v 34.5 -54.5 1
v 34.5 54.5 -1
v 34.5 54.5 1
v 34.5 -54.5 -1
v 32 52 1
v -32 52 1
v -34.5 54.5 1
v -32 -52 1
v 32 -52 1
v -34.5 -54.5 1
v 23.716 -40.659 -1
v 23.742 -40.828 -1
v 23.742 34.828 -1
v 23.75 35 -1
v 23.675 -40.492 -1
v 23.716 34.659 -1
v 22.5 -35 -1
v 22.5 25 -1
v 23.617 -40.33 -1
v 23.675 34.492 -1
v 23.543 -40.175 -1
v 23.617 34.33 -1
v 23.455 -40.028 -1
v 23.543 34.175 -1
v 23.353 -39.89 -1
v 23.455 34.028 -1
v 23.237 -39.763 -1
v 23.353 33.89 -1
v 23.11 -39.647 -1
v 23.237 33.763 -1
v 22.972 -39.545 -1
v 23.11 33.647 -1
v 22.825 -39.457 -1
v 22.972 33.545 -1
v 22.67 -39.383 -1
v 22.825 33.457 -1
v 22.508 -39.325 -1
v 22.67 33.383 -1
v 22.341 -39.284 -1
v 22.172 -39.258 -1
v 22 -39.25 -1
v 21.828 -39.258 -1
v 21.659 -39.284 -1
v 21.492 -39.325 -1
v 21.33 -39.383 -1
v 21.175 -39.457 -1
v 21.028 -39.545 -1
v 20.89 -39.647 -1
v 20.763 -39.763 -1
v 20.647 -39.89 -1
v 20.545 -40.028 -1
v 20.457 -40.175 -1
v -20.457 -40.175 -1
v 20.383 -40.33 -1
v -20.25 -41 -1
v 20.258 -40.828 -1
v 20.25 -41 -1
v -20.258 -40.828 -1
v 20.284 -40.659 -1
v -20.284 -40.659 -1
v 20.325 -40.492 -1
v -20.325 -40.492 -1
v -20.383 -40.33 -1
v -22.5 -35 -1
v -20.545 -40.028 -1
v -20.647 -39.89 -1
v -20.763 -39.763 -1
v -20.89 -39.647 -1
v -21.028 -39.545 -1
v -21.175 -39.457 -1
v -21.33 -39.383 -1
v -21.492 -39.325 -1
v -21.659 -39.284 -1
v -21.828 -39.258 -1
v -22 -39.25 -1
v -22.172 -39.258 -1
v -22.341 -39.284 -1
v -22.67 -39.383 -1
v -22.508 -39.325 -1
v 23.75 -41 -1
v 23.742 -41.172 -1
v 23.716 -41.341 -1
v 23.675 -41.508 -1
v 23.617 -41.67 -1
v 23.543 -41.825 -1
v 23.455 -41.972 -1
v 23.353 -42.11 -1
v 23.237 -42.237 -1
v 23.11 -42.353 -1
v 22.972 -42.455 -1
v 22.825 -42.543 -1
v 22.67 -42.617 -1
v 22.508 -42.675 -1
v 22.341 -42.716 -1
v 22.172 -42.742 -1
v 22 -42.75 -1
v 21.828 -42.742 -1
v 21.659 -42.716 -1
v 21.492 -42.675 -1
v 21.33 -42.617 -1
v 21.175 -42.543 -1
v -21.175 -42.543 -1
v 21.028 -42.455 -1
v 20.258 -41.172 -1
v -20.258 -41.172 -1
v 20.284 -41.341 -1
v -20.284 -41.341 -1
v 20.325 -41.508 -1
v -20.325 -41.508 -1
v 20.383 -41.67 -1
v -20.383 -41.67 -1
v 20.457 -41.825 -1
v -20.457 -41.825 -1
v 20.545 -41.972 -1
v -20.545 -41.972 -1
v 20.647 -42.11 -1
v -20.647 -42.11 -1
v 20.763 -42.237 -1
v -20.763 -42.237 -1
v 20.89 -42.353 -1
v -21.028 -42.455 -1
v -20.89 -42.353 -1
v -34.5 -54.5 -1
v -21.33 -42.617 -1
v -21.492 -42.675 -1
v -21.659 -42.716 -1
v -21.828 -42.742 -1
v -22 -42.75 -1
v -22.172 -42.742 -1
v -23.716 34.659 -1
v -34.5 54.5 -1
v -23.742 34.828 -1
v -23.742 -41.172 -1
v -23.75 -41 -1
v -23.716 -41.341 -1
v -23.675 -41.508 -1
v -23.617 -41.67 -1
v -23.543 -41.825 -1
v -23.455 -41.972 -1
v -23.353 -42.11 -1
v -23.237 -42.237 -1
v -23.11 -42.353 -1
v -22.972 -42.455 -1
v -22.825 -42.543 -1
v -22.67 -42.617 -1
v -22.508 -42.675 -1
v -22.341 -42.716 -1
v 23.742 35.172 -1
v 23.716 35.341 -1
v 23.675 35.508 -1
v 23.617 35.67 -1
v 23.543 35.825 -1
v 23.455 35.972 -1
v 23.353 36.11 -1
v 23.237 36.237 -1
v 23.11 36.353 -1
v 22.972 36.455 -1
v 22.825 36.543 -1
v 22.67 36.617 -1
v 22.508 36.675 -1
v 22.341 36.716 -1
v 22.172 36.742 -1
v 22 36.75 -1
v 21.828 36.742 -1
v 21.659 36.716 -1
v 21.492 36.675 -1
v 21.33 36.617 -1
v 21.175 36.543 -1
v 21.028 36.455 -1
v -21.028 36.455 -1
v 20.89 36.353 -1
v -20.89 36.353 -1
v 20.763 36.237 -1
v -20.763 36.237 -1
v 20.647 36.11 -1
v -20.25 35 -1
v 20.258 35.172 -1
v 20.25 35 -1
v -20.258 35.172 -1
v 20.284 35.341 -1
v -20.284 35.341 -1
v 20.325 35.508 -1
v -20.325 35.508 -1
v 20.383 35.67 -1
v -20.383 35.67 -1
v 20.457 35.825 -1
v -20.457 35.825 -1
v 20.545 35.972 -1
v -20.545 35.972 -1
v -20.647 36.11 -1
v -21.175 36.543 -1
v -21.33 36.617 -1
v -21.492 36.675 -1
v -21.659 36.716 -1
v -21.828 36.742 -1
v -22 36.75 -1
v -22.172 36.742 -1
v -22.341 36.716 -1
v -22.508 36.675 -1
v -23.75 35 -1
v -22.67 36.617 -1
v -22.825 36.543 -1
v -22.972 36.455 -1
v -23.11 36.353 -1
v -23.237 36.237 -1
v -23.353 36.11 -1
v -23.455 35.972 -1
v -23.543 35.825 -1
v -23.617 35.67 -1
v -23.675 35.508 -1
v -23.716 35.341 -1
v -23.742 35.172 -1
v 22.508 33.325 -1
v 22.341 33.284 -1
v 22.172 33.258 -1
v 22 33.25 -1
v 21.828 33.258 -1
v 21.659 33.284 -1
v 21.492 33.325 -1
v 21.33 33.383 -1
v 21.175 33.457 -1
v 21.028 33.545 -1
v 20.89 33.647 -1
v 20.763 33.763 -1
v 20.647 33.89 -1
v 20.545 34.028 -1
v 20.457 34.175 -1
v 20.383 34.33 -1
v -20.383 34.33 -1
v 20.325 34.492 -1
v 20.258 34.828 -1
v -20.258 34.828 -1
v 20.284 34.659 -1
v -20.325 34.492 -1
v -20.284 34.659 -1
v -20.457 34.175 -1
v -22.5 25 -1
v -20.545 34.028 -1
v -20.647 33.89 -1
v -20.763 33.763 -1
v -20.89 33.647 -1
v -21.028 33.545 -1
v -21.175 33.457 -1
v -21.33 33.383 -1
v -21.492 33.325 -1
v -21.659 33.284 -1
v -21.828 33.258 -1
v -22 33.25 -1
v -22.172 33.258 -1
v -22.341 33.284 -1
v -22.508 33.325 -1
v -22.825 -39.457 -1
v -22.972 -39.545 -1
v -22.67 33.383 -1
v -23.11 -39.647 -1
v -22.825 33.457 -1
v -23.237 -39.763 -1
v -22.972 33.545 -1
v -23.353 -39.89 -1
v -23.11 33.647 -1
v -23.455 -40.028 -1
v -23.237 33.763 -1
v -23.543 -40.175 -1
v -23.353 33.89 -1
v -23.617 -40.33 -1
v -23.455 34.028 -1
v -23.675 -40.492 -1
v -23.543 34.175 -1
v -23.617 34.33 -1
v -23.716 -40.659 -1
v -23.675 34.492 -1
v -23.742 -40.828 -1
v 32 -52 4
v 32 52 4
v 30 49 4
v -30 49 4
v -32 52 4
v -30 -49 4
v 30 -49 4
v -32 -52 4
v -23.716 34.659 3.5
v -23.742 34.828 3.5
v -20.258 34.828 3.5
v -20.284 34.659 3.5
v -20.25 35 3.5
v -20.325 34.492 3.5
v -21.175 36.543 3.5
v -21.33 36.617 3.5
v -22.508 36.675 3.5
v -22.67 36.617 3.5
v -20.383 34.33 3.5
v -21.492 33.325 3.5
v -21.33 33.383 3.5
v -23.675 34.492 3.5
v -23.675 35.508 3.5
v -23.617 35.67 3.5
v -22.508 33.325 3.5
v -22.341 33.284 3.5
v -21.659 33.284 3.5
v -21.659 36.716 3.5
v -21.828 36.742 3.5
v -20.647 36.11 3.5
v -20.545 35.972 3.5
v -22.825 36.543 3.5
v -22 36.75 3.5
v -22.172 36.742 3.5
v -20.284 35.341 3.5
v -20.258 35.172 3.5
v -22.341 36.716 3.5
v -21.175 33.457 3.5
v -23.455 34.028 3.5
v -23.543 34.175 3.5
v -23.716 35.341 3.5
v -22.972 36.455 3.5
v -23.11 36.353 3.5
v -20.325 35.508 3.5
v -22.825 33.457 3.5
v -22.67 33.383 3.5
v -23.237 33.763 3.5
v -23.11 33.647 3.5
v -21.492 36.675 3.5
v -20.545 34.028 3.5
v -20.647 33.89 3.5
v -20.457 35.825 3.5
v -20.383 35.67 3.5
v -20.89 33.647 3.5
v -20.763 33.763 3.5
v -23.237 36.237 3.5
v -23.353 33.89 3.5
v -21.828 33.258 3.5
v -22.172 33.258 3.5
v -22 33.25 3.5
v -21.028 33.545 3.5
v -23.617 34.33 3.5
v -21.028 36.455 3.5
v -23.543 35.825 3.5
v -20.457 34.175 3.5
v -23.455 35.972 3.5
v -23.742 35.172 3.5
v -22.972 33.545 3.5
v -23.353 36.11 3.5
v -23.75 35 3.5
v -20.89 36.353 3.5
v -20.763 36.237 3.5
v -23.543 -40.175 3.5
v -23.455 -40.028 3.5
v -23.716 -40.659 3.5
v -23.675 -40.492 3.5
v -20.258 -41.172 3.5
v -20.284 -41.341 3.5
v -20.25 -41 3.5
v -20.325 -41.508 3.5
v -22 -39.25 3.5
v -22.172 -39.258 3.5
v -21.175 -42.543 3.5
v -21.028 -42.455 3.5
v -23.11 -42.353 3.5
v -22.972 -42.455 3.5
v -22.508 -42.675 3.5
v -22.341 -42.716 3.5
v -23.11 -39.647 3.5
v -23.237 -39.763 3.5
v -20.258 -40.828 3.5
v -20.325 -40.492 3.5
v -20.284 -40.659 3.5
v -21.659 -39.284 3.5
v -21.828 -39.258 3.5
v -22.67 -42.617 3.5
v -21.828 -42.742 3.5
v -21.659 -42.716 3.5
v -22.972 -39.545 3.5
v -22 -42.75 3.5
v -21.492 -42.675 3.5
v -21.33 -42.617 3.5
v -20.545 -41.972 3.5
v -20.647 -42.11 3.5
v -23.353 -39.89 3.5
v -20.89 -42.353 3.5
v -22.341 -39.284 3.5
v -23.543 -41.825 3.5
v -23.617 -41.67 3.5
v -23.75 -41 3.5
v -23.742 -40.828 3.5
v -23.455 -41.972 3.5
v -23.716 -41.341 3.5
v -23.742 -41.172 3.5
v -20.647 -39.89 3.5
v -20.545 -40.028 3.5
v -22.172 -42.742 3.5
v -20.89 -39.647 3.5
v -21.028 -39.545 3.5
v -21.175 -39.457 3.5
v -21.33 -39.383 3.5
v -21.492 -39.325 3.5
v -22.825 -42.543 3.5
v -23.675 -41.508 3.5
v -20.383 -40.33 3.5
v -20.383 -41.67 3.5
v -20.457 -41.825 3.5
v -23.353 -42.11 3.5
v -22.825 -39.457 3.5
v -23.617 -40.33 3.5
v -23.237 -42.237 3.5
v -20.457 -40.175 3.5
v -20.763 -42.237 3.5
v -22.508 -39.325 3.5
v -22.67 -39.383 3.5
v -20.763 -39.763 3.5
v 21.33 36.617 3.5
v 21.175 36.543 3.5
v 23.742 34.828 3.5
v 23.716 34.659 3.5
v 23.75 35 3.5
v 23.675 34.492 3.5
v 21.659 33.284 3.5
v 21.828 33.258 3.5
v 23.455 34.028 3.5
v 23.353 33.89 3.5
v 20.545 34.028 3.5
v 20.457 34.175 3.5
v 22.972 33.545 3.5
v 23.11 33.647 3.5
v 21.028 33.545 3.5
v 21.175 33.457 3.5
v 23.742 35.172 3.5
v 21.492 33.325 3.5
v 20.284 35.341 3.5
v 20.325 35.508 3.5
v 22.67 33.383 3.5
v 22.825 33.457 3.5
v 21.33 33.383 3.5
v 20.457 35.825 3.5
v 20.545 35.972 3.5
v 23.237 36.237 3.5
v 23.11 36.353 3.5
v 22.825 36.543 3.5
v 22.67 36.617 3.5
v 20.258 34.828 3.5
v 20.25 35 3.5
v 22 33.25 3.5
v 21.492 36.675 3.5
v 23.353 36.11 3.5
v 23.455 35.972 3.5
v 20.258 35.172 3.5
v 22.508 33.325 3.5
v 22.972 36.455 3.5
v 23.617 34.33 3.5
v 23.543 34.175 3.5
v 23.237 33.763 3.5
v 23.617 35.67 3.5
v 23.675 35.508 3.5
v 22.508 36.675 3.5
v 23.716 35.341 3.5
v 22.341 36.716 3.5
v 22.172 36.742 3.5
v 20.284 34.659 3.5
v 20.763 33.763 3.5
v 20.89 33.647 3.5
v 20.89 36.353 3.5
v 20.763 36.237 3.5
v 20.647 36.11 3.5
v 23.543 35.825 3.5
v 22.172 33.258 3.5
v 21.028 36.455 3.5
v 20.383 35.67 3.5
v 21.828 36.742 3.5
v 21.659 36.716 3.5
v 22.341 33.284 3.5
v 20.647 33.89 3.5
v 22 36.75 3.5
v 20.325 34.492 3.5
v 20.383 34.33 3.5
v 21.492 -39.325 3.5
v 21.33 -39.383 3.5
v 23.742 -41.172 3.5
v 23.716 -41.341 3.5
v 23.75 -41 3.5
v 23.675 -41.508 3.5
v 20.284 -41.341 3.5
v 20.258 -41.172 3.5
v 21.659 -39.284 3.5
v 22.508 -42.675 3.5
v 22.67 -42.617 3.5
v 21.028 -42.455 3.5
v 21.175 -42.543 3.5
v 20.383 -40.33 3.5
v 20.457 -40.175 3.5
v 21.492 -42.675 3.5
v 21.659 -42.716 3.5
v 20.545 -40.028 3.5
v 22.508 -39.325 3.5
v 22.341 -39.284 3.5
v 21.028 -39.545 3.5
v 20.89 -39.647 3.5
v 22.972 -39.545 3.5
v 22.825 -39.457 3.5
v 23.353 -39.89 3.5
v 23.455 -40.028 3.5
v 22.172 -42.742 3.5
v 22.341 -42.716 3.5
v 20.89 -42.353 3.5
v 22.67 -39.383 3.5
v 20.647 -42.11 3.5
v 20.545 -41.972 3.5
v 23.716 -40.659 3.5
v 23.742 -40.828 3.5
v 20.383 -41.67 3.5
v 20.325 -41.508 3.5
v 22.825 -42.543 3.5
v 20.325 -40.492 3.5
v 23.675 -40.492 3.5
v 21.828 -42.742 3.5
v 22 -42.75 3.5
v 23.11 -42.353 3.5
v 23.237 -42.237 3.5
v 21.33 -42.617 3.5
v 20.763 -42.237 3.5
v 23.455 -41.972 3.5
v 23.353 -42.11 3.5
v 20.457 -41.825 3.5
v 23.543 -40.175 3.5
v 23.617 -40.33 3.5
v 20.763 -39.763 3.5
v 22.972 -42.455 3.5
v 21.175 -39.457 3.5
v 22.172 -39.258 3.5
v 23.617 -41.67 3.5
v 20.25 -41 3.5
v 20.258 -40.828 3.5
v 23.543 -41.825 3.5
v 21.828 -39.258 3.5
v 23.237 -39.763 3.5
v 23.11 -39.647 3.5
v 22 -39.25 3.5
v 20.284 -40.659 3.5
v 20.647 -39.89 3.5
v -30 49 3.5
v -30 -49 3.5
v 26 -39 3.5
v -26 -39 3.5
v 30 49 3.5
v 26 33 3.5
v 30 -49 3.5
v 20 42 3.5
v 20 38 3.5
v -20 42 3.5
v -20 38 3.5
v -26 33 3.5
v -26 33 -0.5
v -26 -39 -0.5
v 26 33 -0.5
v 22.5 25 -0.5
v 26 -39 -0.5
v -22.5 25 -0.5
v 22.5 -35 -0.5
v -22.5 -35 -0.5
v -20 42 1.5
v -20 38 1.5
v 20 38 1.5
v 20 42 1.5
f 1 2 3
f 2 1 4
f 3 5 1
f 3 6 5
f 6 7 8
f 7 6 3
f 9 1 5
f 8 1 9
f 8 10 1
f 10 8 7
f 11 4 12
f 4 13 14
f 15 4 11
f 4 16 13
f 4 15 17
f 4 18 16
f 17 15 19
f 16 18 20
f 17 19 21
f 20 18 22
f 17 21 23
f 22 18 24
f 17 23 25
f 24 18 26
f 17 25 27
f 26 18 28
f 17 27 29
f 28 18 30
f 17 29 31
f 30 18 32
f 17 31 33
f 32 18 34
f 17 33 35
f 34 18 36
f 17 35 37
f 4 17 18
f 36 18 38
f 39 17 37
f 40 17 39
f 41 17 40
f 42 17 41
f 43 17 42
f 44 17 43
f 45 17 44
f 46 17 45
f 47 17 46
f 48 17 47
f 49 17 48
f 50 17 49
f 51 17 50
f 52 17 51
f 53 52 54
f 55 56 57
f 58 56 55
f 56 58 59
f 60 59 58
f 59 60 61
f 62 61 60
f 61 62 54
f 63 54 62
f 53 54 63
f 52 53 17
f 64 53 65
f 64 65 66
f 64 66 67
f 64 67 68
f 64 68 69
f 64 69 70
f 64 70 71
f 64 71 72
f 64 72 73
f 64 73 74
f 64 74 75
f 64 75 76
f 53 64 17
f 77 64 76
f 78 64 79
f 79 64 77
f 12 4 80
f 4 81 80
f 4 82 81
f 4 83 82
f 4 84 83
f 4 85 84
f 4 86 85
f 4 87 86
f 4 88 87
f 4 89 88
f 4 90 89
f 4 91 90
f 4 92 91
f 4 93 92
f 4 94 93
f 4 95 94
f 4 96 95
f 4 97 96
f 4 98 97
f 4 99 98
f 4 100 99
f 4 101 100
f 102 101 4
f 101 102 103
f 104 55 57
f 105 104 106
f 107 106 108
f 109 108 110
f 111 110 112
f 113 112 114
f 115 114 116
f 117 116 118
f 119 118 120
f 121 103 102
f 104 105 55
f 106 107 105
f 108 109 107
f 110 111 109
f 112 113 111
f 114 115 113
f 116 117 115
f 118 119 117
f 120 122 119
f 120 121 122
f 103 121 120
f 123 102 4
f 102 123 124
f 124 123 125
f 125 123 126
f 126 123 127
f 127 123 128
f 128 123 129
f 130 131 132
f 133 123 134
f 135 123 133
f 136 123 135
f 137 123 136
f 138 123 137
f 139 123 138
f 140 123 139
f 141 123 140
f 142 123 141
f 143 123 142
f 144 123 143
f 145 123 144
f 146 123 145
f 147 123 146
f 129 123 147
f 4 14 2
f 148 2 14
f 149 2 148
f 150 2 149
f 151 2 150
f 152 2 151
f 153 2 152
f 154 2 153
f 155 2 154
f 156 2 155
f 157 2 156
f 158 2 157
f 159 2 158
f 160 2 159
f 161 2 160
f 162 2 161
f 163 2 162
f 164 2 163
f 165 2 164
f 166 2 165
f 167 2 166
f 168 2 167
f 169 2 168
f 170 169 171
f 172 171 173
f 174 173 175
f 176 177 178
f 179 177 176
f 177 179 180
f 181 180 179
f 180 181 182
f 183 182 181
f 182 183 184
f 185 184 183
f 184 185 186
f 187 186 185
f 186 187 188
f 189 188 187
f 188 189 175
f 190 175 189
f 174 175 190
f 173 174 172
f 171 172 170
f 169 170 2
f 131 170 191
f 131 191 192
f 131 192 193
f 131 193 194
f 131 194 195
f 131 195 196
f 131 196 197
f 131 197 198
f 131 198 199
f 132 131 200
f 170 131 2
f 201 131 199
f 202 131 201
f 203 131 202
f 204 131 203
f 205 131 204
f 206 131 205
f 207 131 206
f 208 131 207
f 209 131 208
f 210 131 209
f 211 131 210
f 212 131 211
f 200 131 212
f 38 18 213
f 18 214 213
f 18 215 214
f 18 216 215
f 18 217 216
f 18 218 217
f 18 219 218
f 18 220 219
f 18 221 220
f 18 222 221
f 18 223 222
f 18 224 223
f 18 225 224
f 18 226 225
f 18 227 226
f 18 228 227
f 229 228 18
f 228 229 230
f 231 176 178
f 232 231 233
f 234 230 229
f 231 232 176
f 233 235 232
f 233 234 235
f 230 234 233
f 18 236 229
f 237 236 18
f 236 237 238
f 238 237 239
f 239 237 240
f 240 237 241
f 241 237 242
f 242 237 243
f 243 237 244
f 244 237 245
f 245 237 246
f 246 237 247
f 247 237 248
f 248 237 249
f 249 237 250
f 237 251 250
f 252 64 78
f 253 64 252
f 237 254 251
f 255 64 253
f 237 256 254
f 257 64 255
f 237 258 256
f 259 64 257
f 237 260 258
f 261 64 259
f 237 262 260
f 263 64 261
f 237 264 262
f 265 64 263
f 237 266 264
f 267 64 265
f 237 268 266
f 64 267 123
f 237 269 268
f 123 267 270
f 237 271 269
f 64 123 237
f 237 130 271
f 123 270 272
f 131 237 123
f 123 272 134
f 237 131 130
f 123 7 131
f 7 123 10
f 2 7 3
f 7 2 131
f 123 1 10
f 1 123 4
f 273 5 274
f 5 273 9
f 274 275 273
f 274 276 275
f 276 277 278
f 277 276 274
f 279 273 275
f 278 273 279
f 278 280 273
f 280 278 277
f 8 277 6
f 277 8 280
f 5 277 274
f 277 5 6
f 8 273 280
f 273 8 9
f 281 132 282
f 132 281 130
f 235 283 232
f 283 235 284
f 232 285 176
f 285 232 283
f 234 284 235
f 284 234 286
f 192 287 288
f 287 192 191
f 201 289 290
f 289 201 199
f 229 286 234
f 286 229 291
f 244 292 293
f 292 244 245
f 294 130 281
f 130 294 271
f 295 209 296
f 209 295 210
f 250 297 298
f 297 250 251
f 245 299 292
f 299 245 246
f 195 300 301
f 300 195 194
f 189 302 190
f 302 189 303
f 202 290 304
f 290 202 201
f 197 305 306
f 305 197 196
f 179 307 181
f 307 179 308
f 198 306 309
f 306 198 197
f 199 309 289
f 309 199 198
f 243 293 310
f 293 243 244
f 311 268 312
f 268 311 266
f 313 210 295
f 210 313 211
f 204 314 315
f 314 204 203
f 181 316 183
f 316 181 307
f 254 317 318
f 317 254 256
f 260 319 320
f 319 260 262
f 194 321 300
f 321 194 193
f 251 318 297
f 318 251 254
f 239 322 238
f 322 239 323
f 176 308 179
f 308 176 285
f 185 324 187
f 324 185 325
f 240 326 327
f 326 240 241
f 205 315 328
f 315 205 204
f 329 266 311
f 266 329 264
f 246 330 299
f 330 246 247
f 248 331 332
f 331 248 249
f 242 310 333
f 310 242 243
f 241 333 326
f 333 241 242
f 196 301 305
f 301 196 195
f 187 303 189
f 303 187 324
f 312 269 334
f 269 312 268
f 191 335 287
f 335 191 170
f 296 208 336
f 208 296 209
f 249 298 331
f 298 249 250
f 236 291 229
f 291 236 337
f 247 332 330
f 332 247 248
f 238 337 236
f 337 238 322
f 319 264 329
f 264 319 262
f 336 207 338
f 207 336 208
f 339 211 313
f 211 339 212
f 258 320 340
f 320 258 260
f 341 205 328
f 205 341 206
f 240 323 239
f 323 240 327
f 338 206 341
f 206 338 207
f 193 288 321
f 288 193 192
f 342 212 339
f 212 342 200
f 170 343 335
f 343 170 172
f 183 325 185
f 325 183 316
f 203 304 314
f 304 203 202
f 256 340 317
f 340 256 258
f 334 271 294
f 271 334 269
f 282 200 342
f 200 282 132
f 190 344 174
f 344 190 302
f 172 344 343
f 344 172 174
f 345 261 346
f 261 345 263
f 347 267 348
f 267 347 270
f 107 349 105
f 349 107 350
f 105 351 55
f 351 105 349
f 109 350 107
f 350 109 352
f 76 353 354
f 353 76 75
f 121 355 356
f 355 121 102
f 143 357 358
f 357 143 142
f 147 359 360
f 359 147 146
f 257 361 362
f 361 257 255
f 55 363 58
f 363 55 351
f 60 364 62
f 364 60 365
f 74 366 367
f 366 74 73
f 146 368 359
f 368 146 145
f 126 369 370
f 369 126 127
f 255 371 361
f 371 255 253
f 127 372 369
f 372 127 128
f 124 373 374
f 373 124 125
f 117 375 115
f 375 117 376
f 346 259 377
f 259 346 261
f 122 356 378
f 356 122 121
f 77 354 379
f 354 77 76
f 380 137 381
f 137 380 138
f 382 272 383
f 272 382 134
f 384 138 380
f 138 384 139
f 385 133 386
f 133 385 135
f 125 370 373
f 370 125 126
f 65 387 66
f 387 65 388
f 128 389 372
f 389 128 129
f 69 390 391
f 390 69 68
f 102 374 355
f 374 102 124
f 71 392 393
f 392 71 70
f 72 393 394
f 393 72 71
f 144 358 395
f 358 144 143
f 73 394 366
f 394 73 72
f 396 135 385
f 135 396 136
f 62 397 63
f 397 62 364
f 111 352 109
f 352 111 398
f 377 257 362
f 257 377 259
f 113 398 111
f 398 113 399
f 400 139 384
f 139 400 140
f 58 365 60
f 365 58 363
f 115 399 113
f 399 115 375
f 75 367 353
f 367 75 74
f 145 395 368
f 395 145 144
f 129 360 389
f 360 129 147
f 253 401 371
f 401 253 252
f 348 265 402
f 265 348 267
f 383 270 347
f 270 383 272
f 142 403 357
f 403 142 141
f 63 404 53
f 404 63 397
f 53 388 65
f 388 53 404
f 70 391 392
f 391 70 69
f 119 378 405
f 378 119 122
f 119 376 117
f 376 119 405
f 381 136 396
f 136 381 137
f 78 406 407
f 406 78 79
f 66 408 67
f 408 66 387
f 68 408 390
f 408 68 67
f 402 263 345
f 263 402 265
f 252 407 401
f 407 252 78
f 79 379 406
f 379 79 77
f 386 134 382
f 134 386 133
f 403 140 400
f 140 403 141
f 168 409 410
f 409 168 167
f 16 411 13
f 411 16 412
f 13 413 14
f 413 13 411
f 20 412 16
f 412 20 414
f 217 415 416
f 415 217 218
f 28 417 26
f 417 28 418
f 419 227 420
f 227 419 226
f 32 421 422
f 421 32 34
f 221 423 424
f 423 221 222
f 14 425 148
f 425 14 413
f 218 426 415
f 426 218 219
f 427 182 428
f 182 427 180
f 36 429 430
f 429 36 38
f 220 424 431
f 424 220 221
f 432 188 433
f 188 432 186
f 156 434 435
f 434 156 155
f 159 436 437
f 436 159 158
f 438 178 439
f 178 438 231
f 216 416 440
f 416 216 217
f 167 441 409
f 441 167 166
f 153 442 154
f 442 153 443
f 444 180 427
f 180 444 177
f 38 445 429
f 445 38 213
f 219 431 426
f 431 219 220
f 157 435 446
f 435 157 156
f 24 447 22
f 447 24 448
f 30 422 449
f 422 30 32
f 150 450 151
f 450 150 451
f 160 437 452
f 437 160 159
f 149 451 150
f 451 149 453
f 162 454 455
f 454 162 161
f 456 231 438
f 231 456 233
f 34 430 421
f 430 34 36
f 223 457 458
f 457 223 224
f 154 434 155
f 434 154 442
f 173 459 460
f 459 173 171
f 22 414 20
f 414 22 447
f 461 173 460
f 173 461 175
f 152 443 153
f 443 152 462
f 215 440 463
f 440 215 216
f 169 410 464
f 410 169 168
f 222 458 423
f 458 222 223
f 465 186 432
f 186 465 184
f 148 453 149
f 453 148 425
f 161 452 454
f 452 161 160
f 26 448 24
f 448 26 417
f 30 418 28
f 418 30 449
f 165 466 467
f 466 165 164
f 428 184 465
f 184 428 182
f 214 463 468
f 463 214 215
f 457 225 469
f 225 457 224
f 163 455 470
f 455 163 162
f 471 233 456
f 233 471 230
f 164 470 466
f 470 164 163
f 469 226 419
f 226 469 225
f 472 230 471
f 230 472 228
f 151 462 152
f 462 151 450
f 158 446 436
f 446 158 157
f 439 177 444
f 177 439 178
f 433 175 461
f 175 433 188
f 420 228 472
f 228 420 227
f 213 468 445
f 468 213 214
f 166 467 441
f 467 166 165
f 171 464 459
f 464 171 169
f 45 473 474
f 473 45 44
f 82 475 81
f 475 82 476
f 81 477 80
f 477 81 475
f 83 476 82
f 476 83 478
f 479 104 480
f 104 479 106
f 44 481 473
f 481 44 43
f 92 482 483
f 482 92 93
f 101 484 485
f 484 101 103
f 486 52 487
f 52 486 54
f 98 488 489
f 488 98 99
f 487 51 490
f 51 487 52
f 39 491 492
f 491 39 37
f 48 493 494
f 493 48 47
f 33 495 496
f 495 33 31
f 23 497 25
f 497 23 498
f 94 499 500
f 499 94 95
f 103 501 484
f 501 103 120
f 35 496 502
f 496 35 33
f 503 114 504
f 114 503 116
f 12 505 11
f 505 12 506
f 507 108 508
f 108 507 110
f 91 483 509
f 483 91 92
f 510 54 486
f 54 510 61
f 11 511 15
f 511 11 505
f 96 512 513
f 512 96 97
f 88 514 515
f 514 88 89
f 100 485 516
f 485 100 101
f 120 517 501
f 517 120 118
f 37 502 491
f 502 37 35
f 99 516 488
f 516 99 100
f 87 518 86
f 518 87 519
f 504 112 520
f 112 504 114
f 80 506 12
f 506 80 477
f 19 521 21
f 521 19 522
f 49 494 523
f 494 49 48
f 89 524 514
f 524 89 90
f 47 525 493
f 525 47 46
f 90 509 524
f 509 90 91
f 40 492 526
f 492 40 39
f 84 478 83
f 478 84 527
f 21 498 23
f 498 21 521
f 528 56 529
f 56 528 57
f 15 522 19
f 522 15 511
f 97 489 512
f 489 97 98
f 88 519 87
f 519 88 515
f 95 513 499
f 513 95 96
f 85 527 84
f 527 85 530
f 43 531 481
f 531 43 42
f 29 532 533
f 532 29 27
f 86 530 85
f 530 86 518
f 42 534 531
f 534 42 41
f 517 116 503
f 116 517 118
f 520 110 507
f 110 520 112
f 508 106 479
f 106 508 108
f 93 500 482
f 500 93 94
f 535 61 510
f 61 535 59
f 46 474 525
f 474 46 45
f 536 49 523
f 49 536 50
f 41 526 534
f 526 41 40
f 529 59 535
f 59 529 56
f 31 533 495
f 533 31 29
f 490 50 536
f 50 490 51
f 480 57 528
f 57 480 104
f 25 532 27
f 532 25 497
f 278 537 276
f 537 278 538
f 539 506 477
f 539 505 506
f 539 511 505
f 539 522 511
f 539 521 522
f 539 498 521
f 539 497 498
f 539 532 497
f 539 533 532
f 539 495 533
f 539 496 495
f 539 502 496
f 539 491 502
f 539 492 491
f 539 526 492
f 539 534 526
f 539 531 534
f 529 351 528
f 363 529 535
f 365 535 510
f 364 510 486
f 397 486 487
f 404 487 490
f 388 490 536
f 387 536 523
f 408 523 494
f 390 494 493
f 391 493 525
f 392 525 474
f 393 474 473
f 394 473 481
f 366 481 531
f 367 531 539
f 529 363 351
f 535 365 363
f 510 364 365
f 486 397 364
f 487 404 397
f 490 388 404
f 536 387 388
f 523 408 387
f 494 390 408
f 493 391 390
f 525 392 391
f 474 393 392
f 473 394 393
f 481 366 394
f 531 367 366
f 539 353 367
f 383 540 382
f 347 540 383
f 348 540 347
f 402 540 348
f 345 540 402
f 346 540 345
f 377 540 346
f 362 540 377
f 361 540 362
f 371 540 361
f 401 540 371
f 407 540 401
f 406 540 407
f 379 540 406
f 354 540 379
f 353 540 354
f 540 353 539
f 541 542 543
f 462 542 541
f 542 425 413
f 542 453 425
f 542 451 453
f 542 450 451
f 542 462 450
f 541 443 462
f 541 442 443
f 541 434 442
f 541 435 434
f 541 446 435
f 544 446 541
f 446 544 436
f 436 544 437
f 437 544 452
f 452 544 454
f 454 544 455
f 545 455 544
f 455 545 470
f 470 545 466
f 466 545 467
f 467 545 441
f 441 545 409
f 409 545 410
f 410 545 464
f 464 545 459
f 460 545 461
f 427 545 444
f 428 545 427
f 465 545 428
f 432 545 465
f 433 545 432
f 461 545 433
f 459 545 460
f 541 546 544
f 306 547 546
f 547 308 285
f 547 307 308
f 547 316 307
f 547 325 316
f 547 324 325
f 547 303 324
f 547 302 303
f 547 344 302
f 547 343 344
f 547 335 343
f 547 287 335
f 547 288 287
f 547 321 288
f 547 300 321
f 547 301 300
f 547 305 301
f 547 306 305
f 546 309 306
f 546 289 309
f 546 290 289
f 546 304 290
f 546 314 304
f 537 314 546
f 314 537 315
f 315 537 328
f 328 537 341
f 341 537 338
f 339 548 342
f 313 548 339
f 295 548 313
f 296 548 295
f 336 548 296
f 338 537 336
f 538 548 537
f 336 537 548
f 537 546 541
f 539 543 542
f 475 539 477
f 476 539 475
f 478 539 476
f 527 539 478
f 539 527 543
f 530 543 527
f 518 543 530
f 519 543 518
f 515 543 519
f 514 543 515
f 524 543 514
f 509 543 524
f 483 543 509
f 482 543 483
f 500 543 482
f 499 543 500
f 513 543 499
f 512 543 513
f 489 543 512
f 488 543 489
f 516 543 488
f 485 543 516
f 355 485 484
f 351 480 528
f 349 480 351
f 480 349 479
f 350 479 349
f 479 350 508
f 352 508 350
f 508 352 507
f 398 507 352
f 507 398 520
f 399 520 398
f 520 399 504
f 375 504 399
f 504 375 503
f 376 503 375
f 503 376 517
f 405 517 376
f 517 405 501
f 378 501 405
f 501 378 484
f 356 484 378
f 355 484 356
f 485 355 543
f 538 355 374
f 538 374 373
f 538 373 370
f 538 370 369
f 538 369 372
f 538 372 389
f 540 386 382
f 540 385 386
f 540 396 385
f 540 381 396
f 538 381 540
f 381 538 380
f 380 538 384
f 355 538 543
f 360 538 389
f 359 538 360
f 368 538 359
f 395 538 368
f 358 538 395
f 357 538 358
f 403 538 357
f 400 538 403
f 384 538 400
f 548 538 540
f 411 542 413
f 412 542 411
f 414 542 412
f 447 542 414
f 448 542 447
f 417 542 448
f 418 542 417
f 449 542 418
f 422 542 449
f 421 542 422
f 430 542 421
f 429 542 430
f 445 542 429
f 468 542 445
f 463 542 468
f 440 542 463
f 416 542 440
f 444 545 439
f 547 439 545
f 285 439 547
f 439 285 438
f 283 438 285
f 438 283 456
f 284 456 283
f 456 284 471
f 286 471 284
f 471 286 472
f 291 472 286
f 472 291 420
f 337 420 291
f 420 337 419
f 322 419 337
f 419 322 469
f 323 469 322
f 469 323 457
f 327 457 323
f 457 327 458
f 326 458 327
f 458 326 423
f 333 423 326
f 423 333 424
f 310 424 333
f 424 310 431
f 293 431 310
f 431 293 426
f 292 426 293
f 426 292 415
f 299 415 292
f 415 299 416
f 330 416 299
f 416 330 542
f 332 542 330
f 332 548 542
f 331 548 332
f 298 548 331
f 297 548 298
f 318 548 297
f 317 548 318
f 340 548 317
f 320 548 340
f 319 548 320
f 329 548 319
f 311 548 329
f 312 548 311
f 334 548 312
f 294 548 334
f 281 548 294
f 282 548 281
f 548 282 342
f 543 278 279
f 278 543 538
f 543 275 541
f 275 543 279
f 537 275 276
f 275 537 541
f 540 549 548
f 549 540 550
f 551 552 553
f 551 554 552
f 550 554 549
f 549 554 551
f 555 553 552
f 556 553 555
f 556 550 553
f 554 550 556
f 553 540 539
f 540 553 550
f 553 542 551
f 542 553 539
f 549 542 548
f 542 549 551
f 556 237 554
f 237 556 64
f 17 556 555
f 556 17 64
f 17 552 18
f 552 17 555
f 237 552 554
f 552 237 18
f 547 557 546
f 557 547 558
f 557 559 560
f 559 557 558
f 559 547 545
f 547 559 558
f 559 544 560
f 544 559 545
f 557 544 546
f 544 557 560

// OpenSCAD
// file: config.scad
height = 85;
upper_width = 135;
lower_width = 163;

panel_thickness = 1.5;
top_panel_thickness = 2;
wall_thickness = 2;

outer_bar_diameter = 22;
inner_rod_diameter = 15;

dwt = wall_thickness / 2;
dy = height / 2;
dx_upper = (upper_width + wall_thickness) / 2;
dx_lower = (lower_width +wall_thickness) / 2;
dx_inner_rod = inner_rod_diameter / 2;

p_ulo = [-dx_upper, dy];
p_uli = [-dx_upper+outer_bar_diameter+dwt, dy];
p_uml = [-dx_inner_rod-dwt, dy];
p_umr = [dx_inner_rod+dwt, dy];
p_uri = [dx_upper-outer_bar_diameter-dwt, dy];
p_uro = [dx_upper, dy];

p_llo = [-dx_lower, -dy];
p_lli = [-dx_lower+outer_bar_diameter+dwt, -dy];
p_lml = [-dx_inner_rod-dwt, -dy];
p_lmr = [dx_inner_rod+dwt, -dy];
p_lri = [dx_lower-outer_bar_diameter-dwt, -dy];
p_lro = [dx_lower, -dy];

p_screws = [
  [p_ulo[0]-2, dy-2],
  [p_uml[0]-2, dy-2],
  [p_umr[0]+2, dy-2],
  [p_uro[0]+2, dy-2],
  [p_llo[0]-2, -dy+2],
  [p_lli[0]+2.5, -dy+2],
  [p_lri[0]-2.5, -dy+2],
  [p_lro[0]+2, -dy+2]
];

usb_board_pos = [-22, 36.5, 0];
can_board_position = [-40, 5, 0];
amplifier_board_pos = [-41, -26, 0];
teensy_board_pos = [-19, -10, 0];
bec_module_pos = [25, 0, 0];

mount_screw_diameter = 2.9;
upper_mount_screw_diameter = 3.4;
mount_screw_outer = 6;

small_screw_diameter = 2.1;

screen_mount_hole_size = [65, 105, 4];
screen_angle = 20;
// file: screen_cutaway.scad
module ScreenCutaway(
    board_size=[52, 90],
    screen_extents=20,
    hole_diameter=3.5,
    hole_extents=20)
{
  board_thickness = 2.5;

  display_size = [52, 72];
  display_thickness = 4;
  display_offset = [0, 3];

  screen_size = [45, 60];
  screen_offset = [0, 5];

  hole_centres = [44, 76];
  hole_offset = [0, 3];

  bottom_pin_header_size = [40, 4];
  bottom_pin_header_height = 2;
  bottom_pin_header_offset = [0, -40];

  module Extrusion(pos, size, height)
  {
    linear_extrude(height)
    {
      translate(pos)
      {
        square(size, center=true);
      }
    }
  }

  color("red")
  {
    Extrusion([0, 0], board_size, board_thickness);
  }

  color("silver")
  {
    Extrusion(display_offset, display_size, board_thickness + display_thickness);
  }

  color("green")
  {
    Extrusion(screen_offset, screen_size, screen_extents);
  }

  color("cyan")
  {
    Extrusion(bottom_pin_header_offset, bottom_pin_header_size, board_thickness + bottom_pin_header_height);
  }

  translate(hole_offset)
  {
    dd = hole_centres / 2;
    for(x=[-dd[0], dd[0]])
    {
      for(y=[-dd[1], dd[1]])
      {
        translate([x, y])
        {
          color("green")
          {
            cylinder(d=hole_diameter, h=hole_extents, $fn=64);
          }
        }
      }
    }
  }
}
// main file
use <screen_cutaway.scad>
include <config.scad>

module CaseDisplayMount()
{
  difference()
  {
    union()
    {
      cube([screen_mount_hole_size[0] + 4, screen_mount_hole_size[1] + 4, top_panel_thickness], center=true);

      translate([0, 0, top_panel_thickness])
      {
        cube(screen_mount_hole_size - [1, 1, 0], center=true);
      }
    }

    translate([0, 0, 6])
    {
      rotate([0, 180, 180])
      {
        ScreenCutaway(board_size=[60, 98]);
      }
    }
  }
}

CaseDisplayMount();
